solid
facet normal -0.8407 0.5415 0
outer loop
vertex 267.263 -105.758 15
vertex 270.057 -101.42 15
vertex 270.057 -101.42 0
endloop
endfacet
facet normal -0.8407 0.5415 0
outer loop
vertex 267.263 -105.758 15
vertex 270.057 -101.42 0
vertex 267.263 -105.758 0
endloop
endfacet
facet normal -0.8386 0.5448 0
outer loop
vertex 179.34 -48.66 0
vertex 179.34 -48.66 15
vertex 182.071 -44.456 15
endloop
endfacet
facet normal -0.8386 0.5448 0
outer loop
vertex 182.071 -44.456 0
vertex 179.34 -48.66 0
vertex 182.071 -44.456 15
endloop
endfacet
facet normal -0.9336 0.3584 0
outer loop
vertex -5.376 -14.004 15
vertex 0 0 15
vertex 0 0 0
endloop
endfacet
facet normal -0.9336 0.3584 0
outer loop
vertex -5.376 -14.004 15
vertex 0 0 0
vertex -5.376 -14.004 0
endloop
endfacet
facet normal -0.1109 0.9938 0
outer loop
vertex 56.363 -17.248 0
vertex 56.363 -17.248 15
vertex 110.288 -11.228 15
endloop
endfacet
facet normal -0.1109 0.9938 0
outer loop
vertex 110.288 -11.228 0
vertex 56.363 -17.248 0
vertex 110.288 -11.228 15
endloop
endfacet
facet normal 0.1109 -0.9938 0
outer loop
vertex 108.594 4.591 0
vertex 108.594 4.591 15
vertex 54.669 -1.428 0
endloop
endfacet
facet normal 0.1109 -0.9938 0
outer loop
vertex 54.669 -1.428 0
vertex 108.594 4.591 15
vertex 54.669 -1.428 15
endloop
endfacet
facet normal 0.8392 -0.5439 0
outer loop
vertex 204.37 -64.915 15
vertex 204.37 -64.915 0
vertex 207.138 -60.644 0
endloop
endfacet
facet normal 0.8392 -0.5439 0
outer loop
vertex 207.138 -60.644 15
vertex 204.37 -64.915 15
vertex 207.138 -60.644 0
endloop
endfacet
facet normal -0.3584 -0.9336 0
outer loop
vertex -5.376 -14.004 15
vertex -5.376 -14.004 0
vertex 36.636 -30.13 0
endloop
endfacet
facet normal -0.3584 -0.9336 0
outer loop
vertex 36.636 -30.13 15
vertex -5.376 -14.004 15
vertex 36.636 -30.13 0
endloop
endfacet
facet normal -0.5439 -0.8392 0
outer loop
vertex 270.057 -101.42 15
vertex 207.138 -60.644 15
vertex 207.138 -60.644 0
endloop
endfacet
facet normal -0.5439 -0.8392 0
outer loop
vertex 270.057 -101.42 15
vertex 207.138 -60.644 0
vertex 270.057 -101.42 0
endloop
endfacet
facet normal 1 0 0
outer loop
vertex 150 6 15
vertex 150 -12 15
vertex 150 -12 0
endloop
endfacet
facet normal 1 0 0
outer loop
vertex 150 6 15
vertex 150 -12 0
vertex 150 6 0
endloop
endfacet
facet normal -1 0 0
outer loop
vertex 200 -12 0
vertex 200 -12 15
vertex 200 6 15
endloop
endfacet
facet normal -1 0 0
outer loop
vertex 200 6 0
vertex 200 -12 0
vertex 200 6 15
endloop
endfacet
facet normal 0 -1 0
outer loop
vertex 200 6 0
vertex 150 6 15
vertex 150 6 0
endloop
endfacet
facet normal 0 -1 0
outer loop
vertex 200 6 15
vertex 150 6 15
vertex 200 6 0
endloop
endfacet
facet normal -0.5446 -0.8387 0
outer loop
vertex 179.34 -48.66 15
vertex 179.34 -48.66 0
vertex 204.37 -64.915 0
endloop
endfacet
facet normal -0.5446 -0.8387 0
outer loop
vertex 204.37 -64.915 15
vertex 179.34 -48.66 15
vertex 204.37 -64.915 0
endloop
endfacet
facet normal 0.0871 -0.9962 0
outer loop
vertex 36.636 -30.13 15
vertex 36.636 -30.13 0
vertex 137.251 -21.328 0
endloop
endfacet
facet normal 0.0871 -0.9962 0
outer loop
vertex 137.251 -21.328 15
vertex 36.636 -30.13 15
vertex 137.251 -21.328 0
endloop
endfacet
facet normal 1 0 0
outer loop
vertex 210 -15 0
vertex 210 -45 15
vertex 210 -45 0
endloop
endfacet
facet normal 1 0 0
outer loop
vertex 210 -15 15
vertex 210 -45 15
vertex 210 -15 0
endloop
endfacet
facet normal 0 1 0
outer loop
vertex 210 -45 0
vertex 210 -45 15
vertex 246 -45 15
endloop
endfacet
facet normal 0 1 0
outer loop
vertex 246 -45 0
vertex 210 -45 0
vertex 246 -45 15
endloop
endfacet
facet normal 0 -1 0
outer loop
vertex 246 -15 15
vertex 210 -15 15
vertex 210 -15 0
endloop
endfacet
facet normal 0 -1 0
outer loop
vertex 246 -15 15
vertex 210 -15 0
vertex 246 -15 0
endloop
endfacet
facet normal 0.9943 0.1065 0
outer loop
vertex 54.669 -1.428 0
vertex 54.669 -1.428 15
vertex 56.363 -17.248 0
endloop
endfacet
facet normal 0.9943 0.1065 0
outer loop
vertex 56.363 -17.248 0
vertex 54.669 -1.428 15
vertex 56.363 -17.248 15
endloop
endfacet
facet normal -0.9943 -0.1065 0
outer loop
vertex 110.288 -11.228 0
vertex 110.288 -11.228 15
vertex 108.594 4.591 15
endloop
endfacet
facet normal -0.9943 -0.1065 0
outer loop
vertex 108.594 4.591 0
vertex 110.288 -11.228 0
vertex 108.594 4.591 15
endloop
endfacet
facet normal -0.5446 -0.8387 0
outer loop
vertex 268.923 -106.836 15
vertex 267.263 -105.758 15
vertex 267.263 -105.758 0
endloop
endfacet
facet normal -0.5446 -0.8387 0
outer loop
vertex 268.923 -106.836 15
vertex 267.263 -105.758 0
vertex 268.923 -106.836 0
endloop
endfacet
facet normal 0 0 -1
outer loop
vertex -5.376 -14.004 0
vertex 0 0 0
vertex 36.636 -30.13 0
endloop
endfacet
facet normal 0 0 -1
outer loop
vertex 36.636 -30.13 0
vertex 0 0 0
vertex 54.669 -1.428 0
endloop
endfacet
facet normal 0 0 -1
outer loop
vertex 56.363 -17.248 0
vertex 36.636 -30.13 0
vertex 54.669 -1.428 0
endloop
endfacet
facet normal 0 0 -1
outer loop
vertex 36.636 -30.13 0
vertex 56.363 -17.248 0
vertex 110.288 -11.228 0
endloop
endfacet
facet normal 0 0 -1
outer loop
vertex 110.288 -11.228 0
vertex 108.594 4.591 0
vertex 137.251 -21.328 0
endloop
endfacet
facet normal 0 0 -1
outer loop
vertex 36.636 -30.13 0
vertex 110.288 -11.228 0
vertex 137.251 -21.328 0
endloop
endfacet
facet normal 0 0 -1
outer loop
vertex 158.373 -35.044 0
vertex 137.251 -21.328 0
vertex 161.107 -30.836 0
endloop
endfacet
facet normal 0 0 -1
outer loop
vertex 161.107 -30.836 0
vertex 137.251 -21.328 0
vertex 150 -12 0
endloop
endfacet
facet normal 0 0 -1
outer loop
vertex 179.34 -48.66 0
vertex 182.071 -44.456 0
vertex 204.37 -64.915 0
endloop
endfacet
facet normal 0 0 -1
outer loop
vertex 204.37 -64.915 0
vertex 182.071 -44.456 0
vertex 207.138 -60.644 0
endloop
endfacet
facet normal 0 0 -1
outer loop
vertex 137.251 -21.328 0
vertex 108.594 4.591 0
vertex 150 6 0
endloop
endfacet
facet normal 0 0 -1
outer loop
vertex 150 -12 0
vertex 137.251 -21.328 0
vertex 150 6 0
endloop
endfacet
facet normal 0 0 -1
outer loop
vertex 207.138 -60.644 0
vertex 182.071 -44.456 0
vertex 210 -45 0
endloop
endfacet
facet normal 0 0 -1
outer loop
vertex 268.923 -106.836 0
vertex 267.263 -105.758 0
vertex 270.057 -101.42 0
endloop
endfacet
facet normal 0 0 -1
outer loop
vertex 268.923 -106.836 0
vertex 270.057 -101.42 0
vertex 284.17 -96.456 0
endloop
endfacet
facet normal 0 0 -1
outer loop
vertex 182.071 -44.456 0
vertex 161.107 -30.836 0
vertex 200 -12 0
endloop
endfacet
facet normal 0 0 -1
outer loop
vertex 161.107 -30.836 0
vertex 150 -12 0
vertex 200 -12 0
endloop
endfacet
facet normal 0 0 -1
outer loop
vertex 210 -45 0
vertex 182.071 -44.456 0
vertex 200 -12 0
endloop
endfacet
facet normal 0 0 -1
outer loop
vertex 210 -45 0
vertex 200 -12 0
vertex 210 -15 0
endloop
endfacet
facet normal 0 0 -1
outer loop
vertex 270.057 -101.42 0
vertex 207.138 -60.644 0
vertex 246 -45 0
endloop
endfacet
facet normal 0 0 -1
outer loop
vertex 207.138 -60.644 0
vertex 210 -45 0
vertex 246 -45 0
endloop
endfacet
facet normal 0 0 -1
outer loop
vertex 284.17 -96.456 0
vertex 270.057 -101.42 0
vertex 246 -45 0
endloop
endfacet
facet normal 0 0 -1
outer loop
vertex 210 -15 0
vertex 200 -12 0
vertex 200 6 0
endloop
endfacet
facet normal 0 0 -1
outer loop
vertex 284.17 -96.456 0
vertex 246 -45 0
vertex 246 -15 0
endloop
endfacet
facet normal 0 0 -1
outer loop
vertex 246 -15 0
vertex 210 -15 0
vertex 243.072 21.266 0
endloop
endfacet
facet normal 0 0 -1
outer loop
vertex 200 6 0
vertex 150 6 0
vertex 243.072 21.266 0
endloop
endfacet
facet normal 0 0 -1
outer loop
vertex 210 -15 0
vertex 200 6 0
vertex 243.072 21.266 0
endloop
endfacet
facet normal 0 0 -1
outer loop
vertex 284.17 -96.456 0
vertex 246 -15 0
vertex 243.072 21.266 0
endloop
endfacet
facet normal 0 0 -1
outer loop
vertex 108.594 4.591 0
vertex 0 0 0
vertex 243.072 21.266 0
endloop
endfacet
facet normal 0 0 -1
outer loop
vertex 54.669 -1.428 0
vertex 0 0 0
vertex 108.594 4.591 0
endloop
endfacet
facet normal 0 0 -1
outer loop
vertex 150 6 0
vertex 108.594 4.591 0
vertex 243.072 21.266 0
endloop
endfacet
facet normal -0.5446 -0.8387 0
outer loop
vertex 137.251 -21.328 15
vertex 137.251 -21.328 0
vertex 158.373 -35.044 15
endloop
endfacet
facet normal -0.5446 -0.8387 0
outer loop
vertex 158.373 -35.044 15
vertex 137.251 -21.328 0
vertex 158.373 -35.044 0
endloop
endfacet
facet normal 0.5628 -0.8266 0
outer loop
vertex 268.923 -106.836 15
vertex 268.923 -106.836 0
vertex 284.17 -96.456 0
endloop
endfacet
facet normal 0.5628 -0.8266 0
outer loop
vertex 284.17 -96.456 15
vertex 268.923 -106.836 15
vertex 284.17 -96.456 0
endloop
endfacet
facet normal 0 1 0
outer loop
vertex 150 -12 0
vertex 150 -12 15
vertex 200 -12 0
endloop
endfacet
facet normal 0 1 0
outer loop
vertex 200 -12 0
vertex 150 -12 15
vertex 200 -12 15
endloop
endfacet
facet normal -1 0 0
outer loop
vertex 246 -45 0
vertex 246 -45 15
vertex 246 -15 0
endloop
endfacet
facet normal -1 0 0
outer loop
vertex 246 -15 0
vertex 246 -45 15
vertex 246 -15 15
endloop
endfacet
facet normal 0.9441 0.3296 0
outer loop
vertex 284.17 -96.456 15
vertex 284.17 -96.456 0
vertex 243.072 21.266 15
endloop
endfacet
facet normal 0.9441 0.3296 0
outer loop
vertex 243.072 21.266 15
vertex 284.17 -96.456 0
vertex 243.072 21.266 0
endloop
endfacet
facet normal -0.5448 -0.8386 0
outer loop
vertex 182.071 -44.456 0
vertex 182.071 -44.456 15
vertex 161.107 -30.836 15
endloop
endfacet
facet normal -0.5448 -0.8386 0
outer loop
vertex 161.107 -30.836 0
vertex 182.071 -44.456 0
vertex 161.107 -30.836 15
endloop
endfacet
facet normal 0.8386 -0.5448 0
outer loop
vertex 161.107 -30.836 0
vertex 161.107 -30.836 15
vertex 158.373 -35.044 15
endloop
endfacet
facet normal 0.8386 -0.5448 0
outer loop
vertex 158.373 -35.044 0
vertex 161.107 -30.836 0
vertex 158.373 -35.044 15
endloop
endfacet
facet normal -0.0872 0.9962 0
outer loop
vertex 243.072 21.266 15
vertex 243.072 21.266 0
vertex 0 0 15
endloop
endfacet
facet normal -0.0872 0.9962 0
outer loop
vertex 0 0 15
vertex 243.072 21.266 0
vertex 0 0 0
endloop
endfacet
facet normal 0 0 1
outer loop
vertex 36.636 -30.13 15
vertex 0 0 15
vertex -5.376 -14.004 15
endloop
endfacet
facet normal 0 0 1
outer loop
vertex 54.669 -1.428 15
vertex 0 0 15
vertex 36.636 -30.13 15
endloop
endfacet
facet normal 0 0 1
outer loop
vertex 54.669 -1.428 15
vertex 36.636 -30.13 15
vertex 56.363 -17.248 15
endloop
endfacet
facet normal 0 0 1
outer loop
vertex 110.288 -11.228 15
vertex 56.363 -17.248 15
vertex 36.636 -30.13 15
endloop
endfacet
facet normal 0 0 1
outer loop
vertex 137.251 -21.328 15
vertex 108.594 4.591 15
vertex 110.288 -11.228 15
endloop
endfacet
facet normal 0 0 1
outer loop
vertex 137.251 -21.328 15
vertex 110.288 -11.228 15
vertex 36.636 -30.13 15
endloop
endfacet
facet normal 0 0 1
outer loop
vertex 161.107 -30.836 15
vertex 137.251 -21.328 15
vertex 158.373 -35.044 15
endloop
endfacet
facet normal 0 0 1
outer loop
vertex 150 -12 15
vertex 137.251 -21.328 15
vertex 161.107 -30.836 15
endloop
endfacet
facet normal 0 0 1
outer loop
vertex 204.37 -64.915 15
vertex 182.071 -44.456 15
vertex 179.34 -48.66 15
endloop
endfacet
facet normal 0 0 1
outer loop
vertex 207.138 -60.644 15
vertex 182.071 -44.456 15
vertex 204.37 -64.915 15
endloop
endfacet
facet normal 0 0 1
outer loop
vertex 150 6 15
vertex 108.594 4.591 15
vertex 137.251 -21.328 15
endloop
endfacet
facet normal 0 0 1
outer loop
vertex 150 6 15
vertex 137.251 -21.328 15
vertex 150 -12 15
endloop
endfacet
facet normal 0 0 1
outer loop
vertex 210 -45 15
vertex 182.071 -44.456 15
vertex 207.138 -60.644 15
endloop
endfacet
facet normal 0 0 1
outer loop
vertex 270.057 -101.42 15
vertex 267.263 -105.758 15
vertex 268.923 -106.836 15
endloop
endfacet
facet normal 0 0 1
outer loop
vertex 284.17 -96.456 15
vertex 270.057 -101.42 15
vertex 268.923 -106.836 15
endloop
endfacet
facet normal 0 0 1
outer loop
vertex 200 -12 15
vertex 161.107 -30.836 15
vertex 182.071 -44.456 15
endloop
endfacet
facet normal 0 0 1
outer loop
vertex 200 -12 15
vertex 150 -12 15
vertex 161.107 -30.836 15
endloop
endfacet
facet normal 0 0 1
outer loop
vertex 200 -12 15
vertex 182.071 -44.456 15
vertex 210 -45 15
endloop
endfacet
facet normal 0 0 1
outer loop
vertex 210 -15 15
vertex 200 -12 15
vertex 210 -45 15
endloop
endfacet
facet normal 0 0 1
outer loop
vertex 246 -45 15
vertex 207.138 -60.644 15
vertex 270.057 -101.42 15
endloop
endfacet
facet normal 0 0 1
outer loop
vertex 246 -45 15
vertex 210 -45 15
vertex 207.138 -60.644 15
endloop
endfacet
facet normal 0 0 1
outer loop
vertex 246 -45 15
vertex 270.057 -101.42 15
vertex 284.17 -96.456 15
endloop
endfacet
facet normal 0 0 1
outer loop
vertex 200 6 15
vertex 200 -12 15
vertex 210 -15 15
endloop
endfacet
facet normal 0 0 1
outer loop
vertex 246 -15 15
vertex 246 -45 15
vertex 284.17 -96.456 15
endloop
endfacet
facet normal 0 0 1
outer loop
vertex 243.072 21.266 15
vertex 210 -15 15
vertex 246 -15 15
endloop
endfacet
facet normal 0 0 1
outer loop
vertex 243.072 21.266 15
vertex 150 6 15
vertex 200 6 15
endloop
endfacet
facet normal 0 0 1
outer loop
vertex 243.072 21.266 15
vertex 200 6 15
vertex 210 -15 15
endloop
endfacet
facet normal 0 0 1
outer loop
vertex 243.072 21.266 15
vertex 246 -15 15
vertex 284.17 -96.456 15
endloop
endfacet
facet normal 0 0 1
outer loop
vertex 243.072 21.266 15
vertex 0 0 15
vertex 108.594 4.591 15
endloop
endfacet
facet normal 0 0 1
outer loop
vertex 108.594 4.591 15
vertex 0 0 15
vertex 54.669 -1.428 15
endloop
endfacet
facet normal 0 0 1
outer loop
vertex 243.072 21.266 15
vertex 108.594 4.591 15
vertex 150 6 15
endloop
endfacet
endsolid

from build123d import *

# Parameters (mm, degrees)
PAD_DEPTH    = 15
SKETCH_W     = 36
SKETCH_H     = 30
SKETCH_W_2   = 50
SKETCH_H_2   = 18
POCKET_DEPTH = 15


with BuildPart() as part:
    # Sketch001 → Pad (new body)
    with BuildSketch(Plane.XY):
        Polygon((-5.375519, -14.003706), (36.6356, -30.130264), (137.251264, -21.327534), (268.922544, -106.835863), (284.17016, -96.456116), (243.071506, 21.266001), (0, 0), align=None)
    extrude(amount=PAD_DEPTH)

    # Sketch (on Face9 of Pad) → Pocket (cut)
    with BuildSketch(Plane.XY.offset(15)):
        with Locations((228, -30)):
            Rectangle(SKETCH_W, SKETCH_H)
        with Locations((175, -3)):
            Rectangle(SKETCH_W_2, SKETCH_H_2)
        Polygon((54.668897, -1.428386), (56.362903, -17.247945), (110.287964, -11.228361), (108.593958, 4.591198), align=None)
        Polygon((202.786784, -67.35767), (207.137526, -60.644173), (270.056785, -101.41956), (265.725821, -108.145875), align=None)
        Polygon((156.748499, -37.544555), (177.712625, -51.164592), (182.071037, -44.456072), (161.106911, -30.836035), align=None)
    extrude(amount=-POCKET_DEPTH, mode=Mode.SUBTRACT)


solid = part.part
